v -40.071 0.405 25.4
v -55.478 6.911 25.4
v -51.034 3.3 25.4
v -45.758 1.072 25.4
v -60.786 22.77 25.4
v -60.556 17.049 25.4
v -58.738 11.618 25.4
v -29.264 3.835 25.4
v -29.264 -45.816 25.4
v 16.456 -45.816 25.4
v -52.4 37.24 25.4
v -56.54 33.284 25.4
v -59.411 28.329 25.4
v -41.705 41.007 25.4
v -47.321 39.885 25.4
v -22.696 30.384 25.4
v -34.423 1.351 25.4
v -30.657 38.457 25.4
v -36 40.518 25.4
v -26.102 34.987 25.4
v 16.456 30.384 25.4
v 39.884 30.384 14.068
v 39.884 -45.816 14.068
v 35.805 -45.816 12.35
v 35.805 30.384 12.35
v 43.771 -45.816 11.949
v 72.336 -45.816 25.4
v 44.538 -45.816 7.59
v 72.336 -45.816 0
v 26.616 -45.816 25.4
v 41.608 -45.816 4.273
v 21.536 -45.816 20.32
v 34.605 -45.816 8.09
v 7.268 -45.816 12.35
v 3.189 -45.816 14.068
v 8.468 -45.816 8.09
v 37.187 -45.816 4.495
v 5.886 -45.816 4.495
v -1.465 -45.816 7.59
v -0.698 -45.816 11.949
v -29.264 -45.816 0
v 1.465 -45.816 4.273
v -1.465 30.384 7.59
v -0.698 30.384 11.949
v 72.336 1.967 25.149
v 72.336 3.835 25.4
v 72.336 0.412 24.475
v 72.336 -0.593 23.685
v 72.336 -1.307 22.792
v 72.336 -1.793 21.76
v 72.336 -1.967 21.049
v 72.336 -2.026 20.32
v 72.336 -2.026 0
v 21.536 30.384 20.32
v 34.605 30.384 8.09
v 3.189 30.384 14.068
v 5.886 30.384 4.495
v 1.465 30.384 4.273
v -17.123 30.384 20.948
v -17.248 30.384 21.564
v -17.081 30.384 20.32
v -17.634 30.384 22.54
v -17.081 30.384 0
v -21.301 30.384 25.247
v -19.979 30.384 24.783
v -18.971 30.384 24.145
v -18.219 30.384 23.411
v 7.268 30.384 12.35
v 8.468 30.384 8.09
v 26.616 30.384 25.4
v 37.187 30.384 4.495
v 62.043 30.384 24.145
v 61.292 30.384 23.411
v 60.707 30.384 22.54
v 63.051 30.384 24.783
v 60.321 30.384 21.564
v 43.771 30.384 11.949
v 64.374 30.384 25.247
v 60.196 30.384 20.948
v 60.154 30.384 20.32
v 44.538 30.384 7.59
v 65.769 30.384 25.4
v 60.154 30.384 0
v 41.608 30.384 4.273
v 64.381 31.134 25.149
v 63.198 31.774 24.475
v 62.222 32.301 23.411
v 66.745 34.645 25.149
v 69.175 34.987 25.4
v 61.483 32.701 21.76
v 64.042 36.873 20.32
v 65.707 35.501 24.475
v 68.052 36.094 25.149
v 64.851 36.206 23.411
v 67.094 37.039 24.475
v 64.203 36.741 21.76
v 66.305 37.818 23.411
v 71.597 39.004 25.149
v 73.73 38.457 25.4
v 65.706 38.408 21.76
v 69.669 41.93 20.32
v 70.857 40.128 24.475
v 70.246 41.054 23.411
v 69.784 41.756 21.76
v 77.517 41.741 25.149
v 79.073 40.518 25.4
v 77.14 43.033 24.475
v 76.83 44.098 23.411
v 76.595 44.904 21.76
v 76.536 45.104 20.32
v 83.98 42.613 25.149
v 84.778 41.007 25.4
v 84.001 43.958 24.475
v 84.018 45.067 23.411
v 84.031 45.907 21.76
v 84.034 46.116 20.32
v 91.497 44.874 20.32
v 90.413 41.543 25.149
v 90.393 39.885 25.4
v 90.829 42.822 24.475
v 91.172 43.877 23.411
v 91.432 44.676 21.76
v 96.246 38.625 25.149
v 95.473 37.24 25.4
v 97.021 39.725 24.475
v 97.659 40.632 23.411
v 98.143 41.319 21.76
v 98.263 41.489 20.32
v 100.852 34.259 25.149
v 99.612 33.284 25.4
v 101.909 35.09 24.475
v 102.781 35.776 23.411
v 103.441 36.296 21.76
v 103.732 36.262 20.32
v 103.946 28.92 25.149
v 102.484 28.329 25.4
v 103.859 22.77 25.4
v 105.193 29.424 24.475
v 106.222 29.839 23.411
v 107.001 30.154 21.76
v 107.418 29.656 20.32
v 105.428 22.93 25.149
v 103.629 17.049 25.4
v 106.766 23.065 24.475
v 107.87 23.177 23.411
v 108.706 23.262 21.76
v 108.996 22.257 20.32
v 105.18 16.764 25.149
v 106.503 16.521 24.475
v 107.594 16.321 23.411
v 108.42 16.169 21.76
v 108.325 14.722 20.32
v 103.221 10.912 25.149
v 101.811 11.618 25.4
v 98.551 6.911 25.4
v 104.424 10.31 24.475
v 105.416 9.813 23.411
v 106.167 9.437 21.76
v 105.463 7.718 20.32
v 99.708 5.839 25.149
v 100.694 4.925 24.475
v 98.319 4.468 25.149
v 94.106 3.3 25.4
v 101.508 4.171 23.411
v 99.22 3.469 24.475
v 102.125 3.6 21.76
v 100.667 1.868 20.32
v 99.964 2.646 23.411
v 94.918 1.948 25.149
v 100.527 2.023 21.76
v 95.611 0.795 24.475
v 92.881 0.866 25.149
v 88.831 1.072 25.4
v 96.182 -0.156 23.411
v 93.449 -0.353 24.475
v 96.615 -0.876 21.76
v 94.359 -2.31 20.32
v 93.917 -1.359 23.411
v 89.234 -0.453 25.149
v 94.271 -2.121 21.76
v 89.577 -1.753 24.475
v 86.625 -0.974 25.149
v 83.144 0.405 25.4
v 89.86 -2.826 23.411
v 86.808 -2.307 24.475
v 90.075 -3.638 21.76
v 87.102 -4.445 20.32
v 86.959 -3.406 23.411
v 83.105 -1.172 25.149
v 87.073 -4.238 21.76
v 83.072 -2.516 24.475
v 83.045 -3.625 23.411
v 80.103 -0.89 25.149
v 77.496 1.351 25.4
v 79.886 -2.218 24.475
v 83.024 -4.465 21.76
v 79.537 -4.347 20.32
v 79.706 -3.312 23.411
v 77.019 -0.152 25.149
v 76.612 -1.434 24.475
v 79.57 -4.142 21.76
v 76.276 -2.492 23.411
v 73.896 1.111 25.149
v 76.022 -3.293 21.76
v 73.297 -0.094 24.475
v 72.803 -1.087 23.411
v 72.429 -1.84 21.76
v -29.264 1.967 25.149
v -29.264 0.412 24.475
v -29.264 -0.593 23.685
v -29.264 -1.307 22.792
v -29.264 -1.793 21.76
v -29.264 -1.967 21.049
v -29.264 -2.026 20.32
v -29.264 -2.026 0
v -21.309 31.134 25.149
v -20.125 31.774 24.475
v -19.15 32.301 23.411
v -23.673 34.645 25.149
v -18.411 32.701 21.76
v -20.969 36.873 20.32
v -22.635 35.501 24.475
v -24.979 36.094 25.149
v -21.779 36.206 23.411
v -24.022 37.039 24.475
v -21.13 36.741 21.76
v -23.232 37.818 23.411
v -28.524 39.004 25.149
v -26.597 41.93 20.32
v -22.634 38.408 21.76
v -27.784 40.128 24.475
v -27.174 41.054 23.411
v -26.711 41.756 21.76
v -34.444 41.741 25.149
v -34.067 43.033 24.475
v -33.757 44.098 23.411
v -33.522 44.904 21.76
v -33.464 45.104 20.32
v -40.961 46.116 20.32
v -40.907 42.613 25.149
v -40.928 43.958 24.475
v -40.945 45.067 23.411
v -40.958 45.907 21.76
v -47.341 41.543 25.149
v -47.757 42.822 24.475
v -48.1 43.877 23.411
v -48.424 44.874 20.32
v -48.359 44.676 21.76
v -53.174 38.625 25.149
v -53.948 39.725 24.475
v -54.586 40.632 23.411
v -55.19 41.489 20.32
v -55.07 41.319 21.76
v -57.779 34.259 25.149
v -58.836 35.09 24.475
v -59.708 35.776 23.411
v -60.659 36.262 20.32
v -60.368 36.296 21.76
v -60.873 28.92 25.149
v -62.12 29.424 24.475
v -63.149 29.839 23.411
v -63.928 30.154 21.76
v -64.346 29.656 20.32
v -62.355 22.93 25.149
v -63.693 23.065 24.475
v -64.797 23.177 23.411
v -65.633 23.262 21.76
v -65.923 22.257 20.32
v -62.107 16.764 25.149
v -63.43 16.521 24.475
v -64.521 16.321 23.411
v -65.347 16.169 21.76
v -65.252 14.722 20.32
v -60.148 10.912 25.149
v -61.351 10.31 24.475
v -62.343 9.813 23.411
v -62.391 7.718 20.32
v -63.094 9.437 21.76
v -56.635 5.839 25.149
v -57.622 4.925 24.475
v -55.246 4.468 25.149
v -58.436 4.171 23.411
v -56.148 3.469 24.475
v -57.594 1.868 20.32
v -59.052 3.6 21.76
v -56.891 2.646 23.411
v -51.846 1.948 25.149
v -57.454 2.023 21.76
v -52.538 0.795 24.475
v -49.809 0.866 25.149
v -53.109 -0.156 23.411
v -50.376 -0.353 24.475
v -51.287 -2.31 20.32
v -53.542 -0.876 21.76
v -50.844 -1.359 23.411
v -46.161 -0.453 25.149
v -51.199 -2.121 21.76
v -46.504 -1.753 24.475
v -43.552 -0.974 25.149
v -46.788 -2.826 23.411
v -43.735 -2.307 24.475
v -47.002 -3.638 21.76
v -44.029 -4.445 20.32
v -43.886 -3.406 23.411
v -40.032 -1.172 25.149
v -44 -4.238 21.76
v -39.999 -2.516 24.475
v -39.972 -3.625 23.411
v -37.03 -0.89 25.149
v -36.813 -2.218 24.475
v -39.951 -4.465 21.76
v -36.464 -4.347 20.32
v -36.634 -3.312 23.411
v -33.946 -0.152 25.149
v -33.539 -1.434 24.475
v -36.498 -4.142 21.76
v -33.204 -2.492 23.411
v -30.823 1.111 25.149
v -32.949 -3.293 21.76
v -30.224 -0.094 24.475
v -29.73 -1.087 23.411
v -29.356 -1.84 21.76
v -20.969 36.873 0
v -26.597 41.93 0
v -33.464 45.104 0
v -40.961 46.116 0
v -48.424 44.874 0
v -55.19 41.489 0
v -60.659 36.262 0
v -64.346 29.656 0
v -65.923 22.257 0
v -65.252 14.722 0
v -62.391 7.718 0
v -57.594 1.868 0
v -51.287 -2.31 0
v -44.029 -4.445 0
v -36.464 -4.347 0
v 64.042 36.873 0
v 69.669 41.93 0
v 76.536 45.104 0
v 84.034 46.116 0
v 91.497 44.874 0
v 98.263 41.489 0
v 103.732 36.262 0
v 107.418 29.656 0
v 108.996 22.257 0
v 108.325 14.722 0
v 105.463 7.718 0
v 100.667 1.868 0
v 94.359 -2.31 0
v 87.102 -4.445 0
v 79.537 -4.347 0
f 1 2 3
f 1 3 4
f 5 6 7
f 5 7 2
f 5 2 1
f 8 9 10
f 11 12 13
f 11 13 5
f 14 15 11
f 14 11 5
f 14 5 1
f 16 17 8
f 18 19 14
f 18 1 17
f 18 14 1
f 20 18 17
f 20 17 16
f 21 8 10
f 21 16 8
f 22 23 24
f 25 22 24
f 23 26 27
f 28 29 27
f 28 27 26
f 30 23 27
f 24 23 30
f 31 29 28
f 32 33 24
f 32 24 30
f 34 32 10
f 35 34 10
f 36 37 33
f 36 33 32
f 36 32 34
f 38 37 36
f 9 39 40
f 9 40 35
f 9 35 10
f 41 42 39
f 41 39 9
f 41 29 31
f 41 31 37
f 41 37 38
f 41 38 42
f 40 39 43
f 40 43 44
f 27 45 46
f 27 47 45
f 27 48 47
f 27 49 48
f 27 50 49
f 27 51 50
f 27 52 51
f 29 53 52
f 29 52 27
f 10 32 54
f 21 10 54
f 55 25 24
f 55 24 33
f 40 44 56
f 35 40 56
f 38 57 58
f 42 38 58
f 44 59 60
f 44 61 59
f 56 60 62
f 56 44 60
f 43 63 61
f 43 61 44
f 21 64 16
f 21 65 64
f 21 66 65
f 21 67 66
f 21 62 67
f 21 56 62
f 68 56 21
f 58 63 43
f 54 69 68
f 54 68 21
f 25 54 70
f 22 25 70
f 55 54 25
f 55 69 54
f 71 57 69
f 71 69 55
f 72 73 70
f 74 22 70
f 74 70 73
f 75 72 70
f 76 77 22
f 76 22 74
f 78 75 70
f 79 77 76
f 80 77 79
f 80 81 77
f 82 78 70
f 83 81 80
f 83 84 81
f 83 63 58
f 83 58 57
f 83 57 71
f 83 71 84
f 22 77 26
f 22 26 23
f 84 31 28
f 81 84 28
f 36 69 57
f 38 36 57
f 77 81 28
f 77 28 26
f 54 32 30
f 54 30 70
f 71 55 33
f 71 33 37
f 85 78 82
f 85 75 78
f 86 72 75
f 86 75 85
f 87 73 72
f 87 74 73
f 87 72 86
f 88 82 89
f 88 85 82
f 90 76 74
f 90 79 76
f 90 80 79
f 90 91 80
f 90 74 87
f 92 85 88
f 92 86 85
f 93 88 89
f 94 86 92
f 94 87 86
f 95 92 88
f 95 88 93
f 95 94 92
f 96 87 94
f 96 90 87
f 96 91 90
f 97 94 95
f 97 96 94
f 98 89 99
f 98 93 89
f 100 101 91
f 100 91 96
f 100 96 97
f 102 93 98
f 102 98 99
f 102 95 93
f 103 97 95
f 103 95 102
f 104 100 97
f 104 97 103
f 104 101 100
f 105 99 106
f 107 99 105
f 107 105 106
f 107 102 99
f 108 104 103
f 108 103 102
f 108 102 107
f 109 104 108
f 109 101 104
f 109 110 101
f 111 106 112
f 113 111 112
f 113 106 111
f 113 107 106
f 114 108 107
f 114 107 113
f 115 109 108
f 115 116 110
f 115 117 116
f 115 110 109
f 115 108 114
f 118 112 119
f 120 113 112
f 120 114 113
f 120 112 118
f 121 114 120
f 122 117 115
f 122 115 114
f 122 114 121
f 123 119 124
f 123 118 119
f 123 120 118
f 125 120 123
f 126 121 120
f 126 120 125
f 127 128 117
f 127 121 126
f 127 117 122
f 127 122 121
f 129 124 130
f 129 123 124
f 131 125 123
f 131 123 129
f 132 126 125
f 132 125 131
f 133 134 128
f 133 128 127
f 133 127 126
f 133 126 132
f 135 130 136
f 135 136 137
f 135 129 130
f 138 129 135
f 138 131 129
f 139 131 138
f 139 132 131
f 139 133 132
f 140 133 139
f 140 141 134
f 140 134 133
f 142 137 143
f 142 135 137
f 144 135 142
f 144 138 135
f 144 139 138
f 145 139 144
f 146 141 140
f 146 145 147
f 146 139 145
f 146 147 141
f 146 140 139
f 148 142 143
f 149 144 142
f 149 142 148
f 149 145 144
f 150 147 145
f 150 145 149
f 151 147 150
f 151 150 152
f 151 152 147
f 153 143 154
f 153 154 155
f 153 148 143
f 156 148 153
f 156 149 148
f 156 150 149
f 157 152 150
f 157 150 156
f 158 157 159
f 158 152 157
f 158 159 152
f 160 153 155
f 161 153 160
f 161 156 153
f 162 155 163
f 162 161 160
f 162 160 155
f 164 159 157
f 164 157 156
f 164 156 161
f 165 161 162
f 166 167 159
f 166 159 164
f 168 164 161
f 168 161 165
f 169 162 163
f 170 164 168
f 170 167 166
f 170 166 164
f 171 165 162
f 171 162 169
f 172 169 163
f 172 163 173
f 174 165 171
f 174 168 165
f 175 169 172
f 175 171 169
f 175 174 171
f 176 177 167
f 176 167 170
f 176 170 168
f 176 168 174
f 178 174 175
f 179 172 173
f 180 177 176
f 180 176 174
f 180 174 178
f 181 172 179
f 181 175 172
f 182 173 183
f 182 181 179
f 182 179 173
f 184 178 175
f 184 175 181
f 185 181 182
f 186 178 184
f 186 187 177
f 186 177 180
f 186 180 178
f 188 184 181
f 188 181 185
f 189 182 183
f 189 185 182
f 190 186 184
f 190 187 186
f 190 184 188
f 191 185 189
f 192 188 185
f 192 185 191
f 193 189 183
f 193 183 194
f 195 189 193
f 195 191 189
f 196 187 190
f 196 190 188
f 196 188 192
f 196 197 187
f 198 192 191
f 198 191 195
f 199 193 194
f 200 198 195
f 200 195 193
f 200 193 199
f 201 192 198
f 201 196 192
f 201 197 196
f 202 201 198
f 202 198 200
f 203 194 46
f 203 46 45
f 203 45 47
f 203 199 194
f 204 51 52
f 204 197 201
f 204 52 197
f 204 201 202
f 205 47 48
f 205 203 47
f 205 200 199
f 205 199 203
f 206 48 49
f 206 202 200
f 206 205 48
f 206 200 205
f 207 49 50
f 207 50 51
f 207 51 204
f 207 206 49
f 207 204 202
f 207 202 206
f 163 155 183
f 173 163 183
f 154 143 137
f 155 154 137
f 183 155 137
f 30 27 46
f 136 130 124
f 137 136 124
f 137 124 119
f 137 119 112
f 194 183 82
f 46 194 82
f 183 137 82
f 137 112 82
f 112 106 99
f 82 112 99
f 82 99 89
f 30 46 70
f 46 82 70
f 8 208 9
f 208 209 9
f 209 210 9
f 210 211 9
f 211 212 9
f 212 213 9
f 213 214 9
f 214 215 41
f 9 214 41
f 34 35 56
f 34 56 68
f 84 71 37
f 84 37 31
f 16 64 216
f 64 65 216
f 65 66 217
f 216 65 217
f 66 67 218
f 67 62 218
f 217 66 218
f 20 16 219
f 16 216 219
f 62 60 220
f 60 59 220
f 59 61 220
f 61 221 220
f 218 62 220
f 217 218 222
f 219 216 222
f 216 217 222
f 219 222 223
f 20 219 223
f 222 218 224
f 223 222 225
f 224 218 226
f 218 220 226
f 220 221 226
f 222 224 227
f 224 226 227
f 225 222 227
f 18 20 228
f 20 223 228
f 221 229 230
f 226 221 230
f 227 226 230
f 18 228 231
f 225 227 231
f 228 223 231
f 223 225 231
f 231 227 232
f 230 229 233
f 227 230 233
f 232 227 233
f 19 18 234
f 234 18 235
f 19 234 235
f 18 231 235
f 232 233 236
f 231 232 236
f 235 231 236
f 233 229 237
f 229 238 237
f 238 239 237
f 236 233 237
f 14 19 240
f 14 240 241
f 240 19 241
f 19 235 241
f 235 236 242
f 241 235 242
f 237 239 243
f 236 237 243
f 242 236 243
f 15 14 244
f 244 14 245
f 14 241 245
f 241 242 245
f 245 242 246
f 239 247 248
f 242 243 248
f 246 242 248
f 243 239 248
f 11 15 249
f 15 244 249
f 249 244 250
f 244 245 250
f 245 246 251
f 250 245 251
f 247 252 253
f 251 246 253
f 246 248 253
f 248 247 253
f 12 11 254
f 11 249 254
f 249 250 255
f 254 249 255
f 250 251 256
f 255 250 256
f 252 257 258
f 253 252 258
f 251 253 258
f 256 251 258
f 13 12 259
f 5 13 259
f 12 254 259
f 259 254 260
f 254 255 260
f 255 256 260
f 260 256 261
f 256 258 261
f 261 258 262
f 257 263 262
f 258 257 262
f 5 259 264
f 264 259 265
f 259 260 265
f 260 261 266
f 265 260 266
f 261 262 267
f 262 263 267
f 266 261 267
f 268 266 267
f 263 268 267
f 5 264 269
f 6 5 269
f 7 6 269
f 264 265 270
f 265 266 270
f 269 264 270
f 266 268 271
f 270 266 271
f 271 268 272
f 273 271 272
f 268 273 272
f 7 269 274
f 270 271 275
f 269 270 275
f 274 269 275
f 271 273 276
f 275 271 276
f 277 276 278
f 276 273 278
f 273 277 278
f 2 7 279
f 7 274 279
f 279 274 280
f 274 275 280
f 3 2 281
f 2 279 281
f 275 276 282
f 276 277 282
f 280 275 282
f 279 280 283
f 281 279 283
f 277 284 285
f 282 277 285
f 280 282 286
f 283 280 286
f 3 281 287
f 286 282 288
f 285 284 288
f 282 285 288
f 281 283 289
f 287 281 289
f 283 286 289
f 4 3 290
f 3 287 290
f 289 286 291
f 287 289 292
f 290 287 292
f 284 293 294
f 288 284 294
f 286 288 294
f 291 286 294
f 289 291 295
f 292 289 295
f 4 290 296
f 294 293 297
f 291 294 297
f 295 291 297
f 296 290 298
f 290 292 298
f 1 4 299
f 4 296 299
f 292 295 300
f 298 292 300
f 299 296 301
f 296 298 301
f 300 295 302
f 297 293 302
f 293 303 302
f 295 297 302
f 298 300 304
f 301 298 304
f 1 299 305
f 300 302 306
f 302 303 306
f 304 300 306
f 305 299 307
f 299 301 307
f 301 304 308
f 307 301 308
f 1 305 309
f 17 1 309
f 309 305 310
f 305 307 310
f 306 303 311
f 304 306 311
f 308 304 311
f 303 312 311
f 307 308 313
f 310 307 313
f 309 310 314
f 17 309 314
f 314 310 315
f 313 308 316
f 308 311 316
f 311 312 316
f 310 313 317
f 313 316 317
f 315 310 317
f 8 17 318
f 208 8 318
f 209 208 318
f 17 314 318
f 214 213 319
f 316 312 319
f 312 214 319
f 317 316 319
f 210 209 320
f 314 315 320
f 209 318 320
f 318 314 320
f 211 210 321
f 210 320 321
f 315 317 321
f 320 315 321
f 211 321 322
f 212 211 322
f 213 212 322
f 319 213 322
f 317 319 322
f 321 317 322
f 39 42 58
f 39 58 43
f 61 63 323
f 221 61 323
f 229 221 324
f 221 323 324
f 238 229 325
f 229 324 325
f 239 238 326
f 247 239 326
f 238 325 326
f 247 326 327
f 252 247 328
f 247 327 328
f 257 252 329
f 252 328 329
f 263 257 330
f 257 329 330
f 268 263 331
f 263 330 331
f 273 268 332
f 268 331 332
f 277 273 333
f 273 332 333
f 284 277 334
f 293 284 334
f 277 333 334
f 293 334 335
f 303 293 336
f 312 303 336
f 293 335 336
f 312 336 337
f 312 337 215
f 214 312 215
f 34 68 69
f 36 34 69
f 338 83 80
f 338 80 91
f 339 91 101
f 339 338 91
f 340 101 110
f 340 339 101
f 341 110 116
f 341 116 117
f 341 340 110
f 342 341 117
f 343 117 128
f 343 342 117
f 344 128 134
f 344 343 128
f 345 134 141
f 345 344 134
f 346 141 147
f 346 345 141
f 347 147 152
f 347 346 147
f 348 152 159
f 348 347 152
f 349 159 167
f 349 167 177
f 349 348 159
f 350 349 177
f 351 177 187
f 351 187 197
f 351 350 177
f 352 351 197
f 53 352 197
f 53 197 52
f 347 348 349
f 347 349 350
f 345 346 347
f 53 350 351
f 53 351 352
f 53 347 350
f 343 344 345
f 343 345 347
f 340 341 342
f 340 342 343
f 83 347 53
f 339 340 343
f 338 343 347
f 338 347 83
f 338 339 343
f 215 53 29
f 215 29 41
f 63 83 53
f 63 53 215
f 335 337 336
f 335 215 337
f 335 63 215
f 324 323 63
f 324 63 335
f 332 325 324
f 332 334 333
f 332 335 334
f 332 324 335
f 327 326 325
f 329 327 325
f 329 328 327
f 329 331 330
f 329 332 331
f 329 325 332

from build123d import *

# Parameters (mm, degrees)
F1_DEPTH = 25.4
F3_DEPTH = 76.2
F4_SIZE  = 5.08
F5_R     = 5.08


with BuildPart() as f1:
    # F0 (on Top) → F1 (new body)
    with BuildSketch(Plane.XY):
        with BuildLine():
            Line((-29.263646, -2.026047), (-29.263646, -45.816111))
            Line((-29.263646, -45.816111), (21.536354, -45.816111))
            Line((21.536354, -45.816111), (21.536354, 30.383889))
            Line((21.536354, 30.383889), (-17.080803, 30.383889))
            ThreePointArc((-17.080803, 30.383889), (-64.345783, 29.655996), (-29.263646, -2.026047))
        make_face()
    extrude(amount=F1_DEPTH)

    # F2 (on face) → F3 (cut)
    with BuildSketch(Plane(origin=(0, 30.383889, 0), x_dir=(-1, 0, 0), z_dir=(0, 1, 0))):
        Polygon((-1.464986, 4.272543), (1.464986, 7.590214), (0.697935, 11.949494), (-3.188536, 14.067755), (-7.267835, 12.349904), (-8.468165, 8.089517), (-5.885655, 4.494753), align=None)
    extrude(amount=-F3_DEPTH, mode=Mode.SUBTRACT)

    # F4
    f4_edges = [f1.edges().sort_by_distance(p)[0] for p in [
        (21.536354, -7.716111, 25.4),
    ]]
    chamfer(f4_edges, length=F4_SIZE)

    # F5
    f5_edges = [f1.edges().sort_by_distance(p)[0] for p in [
        (-64.345783, 29.655996, 25.4),
    ]]
    fillet(f5_edges, radius=F5_R)

    # F6: F1 across face


with BuildPart() as f1_1:
    add(f1.part)
    add(f1.part.mirror(Plane(origin=(21.536354, -7.716111, 10.16), x_dir=(0, 1, 0), z_dir=(1, 0, 0))))


solid = f1_1.part
